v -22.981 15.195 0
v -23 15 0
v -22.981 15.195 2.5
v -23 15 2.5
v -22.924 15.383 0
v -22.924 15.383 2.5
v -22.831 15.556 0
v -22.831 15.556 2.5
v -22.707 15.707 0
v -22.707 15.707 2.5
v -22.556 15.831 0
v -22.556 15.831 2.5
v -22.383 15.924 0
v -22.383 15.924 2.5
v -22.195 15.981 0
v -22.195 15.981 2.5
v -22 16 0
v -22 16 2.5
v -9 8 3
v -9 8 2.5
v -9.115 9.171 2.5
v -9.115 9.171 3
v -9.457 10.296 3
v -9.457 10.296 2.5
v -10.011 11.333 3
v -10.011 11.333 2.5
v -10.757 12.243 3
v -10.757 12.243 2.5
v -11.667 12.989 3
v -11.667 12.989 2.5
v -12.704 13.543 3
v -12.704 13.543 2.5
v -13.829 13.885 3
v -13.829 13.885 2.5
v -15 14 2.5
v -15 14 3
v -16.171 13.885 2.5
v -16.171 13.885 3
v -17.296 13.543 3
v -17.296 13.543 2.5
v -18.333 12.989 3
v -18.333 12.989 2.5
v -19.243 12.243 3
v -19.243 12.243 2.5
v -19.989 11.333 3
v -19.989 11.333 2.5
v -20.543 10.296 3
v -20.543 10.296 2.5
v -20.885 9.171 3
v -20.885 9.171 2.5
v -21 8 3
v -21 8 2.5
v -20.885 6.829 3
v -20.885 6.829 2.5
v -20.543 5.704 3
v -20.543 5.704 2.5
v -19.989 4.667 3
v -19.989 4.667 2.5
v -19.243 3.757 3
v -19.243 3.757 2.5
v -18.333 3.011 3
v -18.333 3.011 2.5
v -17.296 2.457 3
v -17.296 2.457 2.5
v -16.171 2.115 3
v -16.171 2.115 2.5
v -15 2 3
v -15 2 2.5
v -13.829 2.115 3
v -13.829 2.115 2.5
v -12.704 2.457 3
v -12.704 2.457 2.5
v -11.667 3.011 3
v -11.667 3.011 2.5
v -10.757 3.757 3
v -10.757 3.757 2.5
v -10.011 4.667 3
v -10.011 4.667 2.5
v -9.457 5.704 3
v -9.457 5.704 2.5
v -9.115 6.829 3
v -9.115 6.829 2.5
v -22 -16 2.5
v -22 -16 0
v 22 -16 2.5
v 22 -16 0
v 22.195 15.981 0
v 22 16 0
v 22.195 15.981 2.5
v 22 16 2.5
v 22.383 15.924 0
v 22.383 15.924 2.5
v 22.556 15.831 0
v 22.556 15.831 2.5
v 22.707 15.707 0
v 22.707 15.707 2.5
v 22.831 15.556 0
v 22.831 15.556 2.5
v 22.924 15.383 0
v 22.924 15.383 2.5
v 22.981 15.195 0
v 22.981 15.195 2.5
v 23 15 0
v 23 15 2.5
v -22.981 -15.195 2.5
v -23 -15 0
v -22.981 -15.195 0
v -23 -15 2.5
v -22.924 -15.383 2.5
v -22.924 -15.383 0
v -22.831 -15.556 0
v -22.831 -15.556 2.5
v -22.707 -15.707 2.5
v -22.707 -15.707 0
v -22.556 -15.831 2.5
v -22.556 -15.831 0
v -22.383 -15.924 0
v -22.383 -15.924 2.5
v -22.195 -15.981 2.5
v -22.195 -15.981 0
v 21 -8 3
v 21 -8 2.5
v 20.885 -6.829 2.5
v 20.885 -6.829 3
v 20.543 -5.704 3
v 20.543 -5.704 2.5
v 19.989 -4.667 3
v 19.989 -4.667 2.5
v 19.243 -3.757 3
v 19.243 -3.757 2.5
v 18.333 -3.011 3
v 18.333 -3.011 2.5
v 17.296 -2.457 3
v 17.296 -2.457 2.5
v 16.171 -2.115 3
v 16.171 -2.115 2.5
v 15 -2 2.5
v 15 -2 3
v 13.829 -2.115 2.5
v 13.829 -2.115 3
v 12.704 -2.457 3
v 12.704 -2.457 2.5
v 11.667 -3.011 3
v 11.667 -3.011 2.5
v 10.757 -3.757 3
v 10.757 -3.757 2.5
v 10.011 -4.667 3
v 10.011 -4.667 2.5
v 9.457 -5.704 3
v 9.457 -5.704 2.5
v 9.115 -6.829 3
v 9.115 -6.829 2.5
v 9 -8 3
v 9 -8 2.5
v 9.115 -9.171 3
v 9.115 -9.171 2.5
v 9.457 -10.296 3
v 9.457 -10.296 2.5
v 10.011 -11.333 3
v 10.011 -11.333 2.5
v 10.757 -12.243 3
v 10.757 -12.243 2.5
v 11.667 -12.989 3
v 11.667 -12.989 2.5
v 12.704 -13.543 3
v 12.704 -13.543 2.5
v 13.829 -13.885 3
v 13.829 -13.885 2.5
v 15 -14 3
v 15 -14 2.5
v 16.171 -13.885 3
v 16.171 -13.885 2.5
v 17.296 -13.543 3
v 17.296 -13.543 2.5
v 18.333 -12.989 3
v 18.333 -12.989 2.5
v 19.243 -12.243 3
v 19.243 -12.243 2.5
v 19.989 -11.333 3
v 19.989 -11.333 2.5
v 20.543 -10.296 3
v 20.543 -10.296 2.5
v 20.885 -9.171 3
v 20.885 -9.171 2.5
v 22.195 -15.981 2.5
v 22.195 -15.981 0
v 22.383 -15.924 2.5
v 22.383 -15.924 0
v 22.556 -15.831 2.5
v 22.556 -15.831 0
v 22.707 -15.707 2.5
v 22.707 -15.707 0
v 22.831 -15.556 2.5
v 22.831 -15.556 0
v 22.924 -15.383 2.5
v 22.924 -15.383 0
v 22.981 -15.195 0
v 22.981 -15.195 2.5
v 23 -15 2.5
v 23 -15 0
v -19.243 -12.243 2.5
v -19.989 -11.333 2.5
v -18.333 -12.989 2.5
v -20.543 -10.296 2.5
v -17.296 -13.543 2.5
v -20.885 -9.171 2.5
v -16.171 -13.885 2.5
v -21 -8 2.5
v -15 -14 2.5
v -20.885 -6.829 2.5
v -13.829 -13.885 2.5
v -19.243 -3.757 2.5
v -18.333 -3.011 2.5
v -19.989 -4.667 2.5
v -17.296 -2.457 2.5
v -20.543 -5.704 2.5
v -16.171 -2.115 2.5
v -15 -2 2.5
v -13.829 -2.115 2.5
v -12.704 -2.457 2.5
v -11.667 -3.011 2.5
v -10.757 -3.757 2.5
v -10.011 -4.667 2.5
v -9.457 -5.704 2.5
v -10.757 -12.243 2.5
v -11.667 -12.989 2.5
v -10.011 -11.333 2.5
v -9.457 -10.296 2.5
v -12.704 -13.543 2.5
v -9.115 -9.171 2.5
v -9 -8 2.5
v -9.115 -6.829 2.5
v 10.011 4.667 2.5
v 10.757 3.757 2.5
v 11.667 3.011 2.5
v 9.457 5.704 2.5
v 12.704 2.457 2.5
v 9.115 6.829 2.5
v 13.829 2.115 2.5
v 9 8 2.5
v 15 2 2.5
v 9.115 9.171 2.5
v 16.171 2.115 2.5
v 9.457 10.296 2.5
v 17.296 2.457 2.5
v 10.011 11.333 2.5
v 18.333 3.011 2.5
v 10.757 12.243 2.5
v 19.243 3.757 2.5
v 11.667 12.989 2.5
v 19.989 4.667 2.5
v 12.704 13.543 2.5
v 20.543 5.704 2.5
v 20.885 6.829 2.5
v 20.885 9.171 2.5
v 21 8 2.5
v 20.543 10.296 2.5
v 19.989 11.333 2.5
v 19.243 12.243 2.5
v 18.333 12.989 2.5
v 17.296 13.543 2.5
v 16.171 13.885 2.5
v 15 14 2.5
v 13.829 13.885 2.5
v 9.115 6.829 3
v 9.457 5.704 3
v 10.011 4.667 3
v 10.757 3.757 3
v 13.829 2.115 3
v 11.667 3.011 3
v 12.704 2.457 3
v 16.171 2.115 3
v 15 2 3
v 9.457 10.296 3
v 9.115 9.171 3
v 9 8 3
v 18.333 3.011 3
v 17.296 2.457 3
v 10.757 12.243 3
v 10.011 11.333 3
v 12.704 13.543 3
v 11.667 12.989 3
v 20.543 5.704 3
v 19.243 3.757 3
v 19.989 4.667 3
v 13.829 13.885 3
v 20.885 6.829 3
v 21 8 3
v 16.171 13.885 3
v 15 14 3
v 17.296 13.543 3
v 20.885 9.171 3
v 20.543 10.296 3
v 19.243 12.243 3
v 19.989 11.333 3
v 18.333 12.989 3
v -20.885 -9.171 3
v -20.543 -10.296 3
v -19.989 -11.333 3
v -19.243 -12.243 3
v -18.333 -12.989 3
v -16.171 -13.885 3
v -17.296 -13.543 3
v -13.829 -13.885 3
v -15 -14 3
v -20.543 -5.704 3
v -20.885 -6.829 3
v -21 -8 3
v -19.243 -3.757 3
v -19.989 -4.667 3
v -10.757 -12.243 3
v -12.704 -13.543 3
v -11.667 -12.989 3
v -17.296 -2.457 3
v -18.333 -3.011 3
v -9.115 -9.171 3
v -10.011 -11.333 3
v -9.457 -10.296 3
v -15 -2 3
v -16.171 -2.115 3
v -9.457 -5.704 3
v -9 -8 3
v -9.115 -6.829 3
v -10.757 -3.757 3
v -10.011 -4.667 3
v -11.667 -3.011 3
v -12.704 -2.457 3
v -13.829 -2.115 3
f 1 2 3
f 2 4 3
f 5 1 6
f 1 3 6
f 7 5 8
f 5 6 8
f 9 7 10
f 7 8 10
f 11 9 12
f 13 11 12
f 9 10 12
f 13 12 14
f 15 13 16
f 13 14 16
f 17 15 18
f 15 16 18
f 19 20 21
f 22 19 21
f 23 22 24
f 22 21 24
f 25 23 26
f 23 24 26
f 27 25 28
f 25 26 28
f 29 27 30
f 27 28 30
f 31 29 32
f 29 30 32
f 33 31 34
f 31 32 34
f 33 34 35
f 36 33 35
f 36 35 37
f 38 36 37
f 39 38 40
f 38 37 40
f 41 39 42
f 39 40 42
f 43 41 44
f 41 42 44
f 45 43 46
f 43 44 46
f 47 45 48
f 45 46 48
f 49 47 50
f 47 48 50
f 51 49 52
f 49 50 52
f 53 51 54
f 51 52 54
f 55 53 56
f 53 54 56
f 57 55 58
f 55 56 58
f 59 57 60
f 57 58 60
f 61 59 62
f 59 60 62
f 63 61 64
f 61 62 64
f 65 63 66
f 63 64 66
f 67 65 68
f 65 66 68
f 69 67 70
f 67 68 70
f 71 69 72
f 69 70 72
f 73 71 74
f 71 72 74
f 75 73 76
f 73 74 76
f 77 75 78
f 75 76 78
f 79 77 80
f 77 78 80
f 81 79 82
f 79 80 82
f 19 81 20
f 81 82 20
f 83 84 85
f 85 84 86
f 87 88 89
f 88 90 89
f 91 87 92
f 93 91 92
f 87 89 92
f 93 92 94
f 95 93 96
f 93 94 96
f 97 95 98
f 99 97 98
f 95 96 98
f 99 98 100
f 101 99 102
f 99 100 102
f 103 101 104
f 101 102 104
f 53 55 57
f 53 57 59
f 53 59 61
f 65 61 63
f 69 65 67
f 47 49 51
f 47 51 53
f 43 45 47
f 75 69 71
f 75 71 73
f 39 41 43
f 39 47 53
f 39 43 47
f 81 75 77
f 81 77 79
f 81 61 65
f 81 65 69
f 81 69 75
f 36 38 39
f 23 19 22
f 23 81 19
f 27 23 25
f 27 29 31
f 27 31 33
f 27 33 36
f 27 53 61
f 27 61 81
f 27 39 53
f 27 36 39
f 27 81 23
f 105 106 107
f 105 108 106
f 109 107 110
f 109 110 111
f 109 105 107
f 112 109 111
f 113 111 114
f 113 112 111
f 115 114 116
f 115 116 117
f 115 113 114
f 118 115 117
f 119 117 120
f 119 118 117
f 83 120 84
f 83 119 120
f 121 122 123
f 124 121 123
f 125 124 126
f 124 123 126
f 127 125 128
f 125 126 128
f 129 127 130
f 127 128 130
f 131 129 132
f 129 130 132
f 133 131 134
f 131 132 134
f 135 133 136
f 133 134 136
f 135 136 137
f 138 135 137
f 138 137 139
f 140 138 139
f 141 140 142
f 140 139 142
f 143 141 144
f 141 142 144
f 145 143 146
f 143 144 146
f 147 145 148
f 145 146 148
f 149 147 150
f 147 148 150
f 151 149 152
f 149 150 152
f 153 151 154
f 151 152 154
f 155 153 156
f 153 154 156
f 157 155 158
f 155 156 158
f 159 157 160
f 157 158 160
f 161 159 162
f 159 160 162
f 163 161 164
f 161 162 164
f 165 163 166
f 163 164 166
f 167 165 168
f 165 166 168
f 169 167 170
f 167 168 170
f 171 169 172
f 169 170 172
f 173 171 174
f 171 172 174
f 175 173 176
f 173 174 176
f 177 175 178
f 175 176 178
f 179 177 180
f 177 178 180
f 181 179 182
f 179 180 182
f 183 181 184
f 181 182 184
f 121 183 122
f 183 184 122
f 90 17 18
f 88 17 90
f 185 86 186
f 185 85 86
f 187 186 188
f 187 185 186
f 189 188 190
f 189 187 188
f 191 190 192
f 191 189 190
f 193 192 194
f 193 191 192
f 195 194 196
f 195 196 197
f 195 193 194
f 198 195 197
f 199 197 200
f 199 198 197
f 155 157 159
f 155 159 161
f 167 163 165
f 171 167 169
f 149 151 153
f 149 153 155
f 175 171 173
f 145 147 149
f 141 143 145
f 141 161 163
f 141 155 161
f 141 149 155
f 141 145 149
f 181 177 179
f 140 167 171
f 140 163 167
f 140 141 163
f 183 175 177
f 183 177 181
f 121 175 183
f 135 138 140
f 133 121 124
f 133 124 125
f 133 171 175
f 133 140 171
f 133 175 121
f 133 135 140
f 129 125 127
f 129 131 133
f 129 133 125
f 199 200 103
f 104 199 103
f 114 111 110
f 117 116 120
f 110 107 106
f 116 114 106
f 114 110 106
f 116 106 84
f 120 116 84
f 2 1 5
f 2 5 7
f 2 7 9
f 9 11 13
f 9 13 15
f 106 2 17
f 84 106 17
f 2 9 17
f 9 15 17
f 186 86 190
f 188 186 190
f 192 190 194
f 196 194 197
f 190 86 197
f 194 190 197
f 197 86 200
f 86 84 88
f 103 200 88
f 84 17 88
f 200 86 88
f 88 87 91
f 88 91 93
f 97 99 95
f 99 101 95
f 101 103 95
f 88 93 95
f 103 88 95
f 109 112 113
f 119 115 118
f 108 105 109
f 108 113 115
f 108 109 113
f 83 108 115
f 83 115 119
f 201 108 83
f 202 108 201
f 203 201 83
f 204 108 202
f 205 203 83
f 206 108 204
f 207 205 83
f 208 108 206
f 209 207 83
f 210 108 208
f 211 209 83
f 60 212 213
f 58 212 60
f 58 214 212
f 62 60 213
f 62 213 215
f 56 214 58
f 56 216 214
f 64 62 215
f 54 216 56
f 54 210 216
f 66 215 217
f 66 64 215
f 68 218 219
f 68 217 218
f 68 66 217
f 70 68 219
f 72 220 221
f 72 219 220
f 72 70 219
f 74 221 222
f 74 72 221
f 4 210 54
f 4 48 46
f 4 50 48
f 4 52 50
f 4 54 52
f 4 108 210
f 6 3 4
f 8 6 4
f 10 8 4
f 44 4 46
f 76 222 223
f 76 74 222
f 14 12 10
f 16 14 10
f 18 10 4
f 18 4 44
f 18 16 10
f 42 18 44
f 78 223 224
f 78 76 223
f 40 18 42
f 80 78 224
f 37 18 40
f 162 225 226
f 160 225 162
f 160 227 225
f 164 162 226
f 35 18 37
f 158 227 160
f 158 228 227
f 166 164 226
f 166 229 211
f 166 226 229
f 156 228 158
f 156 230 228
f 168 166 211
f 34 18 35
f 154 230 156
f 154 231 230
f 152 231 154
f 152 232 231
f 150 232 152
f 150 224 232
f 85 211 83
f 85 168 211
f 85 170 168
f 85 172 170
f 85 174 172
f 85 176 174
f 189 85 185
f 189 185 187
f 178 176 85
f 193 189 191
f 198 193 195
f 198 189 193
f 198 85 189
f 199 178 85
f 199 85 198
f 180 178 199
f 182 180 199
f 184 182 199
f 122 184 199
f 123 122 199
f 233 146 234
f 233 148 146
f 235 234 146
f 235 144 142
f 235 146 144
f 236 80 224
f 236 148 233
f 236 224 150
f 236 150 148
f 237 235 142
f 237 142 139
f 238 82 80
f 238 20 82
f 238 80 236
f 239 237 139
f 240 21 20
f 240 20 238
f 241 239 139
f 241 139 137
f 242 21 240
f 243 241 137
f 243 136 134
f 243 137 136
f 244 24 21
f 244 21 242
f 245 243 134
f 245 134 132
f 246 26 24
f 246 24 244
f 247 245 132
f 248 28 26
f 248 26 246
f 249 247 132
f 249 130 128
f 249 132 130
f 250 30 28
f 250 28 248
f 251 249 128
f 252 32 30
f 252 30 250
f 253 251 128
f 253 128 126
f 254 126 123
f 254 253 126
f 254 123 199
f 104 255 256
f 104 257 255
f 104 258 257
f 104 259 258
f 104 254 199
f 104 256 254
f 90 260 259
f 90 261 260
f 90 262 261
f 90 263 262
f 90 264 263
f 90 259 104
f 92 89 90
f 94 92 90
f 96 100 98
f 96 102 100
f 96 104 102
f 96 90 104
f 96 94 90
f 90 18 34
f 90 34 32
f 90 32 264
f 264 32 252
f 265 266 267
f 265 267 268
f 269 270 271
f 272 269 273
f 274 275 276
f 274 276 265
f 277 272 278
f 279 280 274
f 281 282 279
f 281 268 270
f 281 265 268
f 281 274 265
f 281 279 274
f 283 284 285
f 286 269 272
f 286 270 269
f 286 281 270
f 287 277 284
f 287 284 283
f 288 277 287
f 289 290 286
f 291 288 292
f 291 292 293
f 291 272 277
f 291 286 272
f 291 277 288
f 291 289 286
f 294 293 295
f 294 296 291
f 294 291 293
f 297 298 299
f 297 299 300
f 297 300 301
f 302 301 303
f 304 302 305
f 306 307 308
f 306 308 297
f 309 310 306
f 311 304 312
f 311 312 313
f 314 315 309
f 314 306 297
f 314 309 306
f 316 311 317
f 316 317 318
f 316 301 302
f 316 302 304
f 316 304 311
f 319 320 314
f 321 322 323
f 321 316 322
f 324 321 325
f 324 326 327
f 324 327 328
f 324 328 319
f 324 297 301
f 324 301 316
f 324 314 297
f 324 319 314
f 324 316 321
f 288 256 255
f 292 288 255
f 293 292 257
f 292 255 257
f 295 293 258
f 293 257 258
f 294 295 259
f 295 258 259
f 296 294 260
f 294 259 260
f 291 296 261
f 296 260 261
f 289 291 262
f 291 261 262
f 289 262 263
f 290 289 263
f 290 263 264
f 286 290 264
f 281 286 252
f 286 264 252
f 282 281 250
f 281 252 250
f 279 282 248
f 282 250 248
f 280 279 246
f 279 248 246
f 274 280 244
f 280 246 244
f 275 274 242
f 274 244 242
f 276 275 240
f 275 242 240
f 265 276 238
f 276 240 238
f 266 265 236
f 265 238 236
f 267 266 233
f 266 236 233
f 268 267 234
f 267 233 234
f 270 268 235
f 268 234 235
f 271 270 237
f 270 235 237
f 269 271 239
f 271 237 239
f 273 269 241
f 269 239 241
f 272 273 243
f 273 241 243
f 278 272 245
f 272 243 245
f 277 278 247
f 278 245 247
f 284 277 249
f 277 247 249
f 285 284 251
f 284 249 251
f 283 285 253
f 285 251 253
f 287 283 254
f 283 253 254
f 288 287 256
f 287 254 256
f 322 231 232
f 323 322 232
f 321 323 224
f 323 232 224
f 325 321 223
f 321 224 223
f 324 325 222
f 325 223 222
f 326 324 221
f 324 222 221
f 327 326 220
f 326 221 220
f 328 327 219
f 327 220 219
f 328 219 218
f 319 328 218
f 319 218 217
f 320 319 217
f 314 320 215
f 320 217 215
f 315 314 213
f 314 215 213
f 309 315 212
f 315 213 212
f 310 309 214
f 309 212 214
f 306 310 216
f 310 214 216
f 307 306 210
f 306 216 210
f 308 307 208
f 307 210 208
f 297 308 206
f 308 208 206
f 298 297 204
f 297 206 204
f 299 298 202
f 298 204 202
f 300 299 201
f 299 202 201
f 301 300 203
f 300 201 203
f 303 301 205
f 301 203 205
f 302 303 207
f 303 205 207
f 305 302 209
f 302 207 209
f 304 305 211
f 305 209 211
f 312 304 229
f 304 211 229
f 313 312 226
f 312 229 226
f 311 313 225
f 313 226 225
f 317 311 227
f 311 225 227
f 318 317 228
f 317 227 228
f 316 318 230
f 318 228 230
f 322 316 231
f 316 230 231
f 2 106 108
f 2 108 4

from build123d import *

# Parameters (mm, degrees)
F0_W     = 46
F0_H     = 32
F1_DEPTH = 2.5
F2_R     = 6
F3_DEPTH = 0.5
F4_R     = 1


with BuildPart() as f1:
    # F0 (on Top) → F1 (new body)
    with BuildSketch(Plane.XY):
        Rectangle(F0_W, F0_H)
    extrude(amount=F1_DEPTH)

    # F2 (on face) → F3 (join)
    with BuildSketch(Plane.XY.offset(2.5)):
        with Locations((-15, 8)):
            Circle(F2_R)
        with Locations((15, 8)):
            Circle(F2_R)
        with Locations((-15, -8)):
            Circle(F2_R)
        with Locations((15, -8)):
            Circle(F2_R)
    extrude(amount=F3_DEPTH)

    # F4
    f4_edges = [f1.edges().sort_by_distance(p)[0] for p in [
        (23, -16, 1.25),
        (-23, -16, 1.25),
        (23, 16, 1.25),
        (-23, 16, 1.25),
    ]]
    fillet(f4_edges, radius=F4_R)


solid = f1.part
